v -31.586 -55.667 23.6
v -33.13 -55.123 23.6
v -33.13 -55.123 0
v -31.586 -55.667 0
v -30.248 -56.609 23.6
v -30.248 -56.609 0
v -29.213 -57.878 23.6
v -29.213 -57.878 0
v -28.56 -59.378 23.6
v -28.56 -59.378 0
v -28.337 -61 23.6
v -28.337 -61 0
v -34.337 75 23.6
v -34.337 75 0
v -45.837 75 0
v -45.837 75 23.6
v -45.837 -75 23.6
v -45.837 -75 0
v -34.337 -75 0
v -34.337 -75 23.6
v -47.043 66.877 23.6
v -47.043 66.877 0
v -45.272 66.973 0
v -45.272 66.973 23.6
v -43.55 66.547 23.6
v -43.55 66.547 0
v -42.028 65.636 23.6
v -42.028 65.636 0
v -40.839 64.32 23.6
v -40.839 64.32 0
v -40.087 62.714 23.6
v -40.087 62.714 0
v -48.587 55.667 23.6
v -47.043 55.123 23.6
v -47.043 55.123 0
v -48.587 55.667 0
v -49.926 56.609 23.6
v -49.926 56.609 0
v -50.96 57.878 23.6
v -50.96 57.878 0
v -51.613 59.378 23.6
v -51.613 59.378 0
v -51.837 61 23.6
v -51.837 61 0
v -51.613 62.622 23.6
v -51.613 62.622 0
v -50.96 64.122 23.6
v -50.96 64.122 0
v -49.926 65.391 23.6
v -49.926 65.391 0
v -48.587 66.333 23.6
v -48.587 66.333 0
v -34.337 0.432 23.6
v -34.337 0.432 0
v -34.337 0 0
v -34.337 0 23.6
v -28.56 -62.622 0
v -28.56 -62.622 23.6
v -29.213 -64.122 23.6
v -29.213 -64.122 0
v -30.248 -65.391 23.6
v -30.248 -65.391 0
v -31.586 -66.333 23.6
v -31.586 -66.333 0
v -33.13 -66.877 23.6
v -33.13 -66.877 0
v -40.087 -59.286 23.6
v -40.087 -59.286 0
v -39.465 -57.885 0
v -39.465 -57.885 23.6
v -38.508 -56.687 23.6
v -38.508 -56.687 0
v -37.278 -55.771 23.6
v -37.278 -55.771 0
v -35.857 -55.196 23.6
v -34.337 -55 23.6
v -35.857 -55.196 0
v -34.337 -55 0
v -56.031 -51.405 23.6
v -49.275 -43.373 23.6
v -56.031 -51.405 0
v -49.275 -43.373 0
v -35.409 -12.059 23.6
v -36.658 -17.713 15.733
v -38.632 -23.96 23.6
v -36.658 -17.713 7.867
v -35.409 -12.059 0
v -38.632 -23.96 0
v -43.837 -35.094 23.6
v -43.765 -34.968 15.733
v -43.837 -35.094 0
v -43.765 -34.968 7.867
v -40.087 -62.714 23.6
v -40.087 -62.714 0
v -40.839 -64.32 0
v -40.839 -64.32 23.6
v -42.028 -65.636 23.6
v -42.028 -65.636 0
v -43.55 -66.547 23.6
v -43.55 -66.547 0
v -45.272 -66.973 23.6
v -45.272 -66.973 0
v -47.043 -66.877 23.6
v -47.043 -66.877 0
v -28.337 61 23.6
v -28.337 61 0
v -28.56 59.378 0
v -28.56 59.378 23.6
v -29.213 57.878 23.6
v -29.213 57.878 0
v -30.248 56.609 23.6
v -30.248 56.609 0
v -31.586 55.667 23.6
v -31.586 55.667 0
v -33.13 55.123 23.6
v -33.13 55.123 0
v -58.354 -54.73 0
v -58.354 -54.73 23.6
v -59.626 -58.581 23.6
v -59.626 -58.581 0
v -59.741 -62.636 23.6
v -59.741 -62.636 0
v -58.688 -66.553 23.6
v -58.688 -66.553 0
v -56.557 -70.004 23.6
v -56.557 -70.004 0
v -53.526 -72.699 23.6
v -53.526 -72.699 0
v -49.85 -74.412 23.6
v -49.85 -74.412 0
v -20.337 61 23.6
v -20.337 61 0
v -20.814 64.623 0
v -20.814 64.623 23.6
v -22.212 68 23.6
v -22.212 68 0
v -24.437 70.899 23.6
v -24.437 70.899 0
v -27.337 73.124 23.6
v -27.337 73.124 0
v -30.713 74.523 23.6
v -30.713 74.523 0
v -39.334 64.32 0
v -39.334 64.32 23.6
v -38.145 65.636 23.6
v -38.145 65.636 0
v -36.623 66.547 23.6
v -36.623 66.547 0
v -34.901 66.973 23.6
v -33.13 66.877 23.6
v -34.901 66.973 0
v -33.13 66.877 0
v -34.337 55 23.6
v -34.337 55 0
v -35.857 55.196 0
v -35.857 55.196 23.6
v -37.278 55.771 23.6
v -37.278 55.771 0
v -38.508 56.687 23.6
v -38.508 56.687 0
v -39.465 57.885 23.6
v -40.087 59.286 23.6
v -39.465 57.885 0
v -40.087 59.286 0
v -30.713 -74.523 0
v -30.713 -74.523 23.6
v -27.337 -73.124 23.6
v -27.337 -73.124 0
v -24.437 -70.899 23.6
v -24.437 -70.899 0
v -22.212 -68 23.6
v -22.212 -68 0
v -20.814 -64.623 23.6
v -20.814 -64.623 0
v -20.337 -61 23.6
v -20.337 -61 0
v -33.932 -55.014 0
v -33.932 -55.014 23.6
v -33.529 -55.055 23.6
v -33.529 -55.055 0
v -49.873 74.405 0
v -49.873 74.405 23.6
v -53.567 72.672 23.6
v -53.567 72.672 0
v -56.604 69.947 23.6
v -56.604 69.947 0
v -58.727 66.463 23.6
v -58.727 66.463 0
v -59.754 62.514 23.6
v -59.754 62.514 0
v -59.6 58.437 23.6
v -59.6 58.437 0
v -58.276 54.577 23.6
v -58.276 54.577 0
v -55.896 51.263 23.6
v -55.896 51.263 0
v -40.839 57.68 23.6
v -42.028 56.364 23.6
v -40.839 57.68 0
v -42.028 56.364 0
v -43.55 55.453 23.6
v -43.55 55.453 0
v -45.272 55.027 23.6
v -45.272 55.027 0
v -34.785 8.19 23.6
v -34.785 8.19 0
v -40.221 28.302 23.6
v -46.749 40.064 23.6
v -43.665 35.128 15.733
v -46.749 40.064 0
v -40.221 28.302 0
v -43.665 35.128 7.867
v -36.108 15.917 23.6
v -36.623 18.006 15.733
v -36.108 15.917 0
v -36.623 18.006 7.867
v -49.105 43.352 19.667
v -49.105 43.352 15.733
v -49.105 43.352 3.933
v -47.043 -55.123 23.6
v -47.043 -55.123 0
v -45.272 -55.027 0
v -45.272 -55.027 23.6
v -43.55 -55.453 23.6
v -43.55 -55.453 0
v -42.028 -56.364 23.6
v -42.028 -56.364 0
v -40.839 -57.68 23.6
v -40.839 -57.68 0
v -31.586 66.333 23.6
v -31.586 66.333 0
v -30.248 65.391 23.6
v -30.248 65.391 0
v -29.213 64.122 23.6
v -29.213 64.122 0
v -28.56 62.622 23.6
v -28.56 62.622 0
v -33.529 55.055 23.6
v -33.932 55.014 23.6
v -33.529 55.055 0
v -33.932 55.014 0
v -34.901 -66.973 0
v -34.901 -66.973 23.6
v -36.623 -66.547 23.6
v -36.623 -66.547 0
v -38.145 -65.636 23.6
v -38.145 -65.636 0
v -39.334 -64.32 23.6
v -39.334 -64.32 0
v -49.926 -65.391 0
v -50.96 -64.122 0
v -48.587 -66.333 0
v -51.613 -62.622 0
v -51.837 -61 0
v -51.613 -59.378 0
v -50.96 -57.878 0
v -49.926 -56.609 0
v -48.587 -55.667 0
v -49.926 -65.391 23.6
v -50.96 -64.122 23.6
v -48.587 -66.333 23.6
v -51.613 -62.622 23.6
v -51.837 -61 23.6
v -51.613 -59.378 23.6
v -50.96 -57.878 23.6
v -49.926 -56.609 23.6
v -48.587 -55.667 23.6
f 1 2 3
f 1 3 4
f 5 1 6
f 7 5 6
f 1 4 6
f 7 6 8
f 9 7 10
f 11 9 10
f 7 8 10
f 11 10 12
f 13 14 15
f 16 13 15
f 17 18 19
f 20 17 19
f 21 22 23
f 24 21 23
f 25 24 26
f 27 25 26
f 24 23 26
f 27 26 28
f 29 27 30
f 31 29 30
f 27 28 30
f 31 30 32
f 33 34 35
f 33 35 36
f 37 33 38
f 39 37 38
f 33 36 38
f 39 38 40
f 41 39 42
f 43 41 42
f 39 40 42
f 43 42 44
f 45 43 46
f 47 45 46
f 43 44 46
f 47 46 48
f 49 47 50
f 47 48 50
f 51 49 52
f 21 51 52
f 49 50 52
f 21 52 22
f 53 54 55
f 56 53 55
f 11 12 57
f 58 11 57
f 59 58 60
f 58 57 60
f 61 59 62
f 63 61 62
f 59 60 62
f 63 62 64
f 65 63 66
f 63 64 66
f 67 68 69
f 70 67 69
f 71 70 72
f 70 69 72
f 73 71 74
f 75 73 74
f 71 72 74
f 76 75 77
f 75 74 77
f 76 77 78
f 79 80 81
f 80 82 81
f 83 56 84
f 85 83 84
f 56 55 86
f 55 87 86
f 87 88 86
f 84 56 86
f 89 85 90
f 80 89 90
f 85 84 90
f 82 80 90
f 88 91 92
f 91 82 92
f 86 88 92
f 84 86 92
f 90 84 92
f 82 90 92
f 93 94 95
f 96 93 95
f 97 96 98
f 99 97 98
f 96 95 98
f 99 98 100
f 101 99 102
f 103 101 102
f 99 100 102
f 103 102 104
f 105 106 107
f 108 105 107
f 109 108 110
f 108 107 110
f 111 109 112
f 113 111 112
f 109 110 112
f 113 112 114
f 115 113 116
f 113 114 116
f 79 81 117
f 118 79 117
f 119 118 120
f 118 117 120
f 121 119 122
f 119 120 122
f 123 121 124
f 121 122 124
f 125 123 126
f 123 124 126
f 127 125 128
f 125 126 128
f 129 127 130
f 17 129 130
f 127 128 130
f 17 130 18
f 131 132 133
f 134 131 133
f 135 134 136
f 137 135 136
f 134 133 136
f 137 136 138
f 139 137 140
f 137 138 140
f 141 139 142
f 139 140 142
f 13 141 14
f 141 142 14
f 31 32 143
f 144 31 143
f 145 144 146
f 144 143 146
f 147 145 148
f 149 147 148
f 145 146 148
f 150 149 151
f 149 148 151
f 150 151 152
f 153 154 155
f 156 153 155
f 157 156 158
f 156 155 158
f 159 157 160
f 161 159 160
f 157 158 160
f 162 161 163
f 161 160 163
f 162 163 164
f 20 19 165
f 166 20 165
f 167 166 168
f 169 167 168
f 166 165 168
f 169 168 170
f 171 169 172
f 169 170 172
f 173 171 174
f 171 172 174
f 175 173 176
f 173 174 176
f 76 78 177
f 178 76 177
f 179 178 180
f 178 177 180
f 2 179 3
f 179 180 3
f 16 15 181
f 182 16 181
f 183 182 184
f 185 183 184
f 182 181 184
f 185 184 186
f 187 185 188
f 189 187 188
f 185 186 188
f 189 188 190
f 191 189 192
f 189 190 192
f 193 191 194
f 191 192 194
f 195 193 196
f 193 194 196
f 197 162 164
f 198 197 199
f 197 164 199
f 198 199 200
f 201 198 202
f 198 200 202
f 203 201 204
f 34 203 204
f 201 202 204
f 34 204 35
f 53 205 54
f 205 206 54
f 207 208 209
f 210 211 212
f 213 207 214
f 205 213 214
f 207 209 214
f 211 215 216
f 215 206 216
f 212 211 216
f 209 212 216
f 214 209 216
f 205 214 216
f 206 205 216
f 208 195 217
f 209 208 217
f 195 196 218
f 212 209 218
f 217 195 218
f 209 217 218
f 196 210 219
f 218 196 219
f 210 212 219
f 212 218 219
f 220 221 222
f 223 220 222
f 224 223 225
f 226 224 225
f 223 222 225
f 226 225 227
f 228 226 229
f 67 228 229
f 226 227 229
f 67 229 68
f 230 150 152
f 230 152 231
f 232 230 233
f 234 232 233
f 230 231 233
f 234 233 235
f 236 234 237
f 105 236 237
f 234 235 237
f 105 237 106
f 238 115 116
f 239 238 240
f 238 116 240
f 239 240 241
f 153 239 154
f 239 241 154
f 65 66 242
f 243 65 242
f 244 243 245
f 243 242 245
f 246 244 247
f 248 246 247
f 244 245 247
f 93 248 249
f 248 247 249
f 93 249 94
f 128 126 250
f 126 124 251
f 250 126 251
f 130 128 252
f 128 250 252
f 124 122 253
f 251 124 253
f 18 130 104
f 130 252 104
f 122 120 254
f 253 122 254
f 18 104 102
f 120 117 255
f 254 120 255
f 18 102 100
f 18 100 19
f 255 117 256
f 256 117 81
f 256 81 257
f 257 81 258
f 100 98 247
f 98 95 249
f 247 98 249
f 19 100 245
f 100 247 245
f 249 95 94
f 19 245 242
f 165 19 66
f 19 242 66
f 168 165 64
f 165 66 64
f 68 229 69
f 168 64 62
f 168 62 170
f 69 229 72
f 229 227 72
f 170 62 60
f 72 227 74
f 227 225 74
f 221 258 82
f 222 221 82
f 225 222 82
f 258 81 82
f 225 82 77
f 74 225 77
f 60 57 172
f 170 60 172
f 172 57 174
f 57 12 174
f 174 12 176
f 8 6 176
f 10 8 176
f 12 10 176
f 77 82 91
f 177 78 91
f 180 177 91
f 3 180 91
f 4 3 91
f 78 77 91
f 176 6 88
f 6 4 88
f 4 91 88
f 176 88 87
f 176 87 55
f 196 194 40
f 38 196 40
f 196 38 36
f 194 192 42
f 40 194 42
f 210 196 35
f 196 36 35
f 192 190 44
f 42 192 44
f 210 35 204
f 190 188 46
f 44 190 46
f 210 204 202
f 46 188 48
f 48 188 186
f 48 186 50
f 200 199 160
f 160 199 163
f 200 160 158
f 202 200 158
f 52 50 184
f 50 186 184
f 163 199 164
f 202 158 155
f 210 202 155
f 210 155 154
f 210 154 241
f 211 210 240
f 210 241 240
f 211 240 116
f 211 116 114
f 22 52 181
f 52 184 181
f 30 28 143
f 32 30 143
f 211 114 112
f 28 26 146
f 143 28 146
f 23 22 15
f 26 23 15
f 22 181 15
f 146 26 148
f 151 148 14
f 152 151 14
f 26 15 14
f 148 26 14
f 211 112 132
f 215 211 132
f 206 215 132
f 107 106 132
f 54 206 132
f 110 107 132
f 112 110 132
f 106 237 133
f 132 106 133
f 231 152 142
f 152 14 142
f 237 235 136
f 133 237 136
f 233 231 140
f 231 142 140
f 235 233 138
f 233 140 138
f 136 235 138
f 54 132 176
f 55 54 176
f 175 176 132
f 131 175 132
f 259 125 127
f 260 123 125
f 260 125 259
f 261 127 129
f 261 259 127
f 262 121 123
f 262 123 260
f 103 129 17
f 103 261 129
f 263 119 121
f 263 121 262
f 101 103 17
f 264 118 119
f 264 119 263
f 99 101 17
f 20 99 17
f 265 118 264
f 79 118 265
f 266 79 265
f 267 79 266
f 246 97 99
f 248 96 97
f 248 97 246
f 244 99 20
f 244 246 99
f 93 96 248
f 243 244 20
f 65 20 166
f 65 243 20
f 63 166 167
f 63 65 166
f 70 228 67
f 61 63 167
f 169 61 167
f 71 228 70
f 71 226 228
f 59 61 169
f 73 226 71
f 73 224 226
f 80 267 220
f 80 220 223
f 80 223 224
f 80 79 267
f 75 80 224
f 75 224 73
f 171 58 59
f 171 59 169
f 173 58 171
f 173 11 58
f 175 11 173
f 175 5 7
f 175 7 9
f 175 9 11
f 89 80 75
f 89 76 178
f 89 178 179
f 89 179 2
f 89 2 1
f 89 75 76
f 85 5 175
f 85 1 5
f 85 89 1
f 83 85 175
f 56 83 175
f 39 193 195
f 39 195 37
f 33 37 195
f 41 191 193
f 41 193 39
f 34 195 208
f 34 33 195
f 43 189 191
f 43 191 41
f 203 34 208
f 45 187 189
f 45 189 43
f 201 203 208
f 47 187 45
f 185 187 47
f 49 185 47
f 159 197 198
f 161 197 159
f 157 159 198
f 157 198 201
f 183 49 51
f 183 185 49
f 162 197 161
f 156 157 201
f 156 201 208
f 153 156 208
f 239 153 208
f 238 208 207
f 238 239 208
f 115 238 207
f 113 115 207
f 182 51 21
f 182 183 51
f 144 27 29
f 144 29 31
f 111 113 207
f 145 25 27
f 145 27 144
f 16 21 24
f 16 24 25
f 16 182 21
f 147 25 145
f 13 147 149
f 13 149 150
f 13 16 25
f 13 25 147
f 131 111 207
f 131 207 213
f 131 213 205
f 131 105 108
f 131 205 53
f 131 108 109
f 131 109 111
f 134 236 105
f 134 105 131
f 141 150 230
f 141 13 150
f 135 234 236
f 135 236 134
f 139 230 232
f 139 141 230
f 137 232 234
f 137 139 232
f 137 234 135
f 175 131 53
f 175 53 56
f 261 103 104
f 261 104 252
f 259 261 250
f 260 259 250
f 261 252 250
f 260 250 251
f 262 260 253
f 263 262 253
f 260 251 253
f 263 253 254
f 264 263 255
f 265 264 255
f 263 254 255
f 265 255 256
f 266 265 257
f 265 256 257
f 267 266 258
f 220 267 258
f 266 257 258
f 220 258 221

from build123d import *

# Parameters (mm, degrees)
F1_DEPTH = 23.6


with BuildPart() as f1:
    # F0 (on Top) → F1 (new body)
    with BuildSketch(Plane.XY):
        with BuildLine():
            ThreePointArc((-33.1300476876, 66.8774403692), (-29.6868850055, 64.7921543722), (-28.3365694268, 61))
            ThreePointArc((-28.3365694268, 61), (-29.6868850055, 57.2078456278), (-33.1300476876, 55.1225596308))
            ThreePointArc((-33.1300476876, 55.1225596308), (-33.6875488508, 54.042895786), (-34.3365694268, 53.0156402887))
            Line((-34.3365694268, 53.0156402887), (-34.3365694268, 47))
            ThreePointArc((-34.3365694268, 47), (-24.4370744902, 51.1005050634), (-20.3365694268, 61))
            ThreePointArc((-20.3365694268, 61), (-24.4370744902, 70.8994949366), (-34.3365694268, 75))
            ThreePointArc((-34.3365694268, 75), (-37.2771676859, 74.6876908892), (-40.0865694268, 73.7646974112))
            ThreePointArc((-40.0865694268, 73.7646974112), (-35.9867280033, 70.9489006394), (-33.1300476876, 66.8774403692))
        make_face()
        with BuildLine():
            ThreePointArc((-45.8365694268, 75), (-42.8959711677, 74.6876908892), (-40.0865694268, 73.7646974112))
            ThreePointArc((-40.0865694268, 73.7646974112), (-37.2771676859, 74.6876908892), (-34.3365694268, 75))
            Line((-34.3365694268, 75), (-45.8365694268, 75))
        make_face()
        with BuildLine():
            ThreePointArc((-47.0430911659, 66.8774403692), (-44.1864108503, 70.9489006394), (-40.0865694268, 73.7646974112))
            ThreePointArc((-40.0865694268, 73.7646974112), (-42.8959711677, 74.6876908892), (-45.8365694268, 75))
            ThreePointArc((-45.8365694268, 75), (-58.7268044704, 66.4627685766), (-55.8960509898, 51.2631200745))
            ThreePointArc((-55.8960509898, 51.2631200745), (-48.4699754944, 47.2499028191), (-40.0865694268, 48.2353025888))
            ThreePointArc((-40.0865694268, 48.2353025888), (-44.1864108503, 51.0510993606), (-47.0430911659, 55.1225596308))
            ThreePointArc((-47.0430911659, 55.1225596308), (-51.8365694268, 61), (-47.0430911659, 66.8774403692))
        make_face()
        with BuildLine():
            ThreePointArc((-20.3365694268, 61), (-24.4370744902, 51.1005050634), (-34.3365694268, 47))
            Line((-34.3365694268, 47), (-34.3365694268, 0.4321282686))
            add(Edge.make_bspline(
                [(-34.3365694268, 0.4321282686), (-34.3361365089, 0.2880770506), (-34.3361368633, 0.1440338578), (-34.3365694268, 0)],
                knots=[0.496094715, 0.496094715, 0.496094715, 0.496094715, 0.4996371995, 0.4996371995, 0.4996371995, 0.4996371995], degree=3))
            Line((-34.3365694268, 0), (-34.3365694268, -47))
            ThreePointArc((-34.3365694268, -47), (-24.4370744902, -51.1005050634), (-20.3365694268, -61))
            Line((-20.3365694268, -61), (-20.3365694268, 61))
        make_face()
        with BuildLine():
            Line((-34.3365694268, 0.4321282686), (-34.3365694268, 47))
            ThreePointArc((-34.3365694268, 47), (-37.2771676859, 47.3123091108), (-40.0865694268, 48.2353025888))
            ThreePointArc((-40.0865694268, 48.2353025888), (-48.4699754944, 47.2499028191), (-55.8960509898, 51.2631200745))
            add(Edge.make_bspline(
                [(-55.8960509898, 51.2631200745), (-40.9271633104, 35.7982841304), (-34.3895319866, 18.0551513004), (-34.3365694268, 0.4321282686)],
                knots=[0.0627121484, 0.0627121484, 0.0627121484, 0.0627121484, 0.496094715, 0.496094715, 0.496094715, 0.496094715], degree=3))
        make_face()
        with BuildLine():
            add(Edge.make_bspline(
                [(-34.3365694268, 0.4321282686), (-34.3361365089, 0.2880770506), (-34.3361368633, 0.1440338578), (-34.3365694268, 0)],
                knots=[0.496094715, 0.496094715, 0.496094715, 0.496094715, 0.4996371995, 0.4996371995, 0.4996371995, 0.4996371995], degree=3))
            Line((-34.3365694268, 0.4321282686), (-34.3365694268, 0))
        make_face()
        with BuildLine():
            ThreePointArc((-34.3365694268, -75), (-24.4370744902, -70.8994949366), (-20.3365694268, -61))
            ThreePointArc((-20.3365694268, -61), (-24.4370744902, -51.1005050634), (-34.3365694268, -47))
            Line((-34.3365694268, -47), (-34.3365694268, -53.0156402887))
            ThreePointArc((-34.3365694268, -53.0156402887), (-33.6875488508, -54.042895786), (-33.1300476876, -55.1225596308))
            ThreePointArc((-33.1300476876, -55.1225596308), (-29.6868850055, -57.2078456278), (-28.3365694268, -61))
            ThreePointArc((-28.3365694268, -61), (-29.6868850055, -64.7921543722), (-33.1300476876, -66.8774403692))
            ThreePointArc((-33.1300476876, -66.8774403692), (-35.9867280033, -70.9489006394), (-40.0865694268, -73.7646974112))
            ThreePointArc((-40.0865694268, -73.7646974112), (-37.2771676859, -74.6876908892), (-34.3365694268, -75))
        make_face()
        with BuildLine():
            Line((-34.3365694268, -47), (-34.3365694268, 0))
            add(Edge.make_bspline(
                [(-34.3365694268, 0), (-34.3900880153, -17.8204800119), (-41.0597288004, -35.4980627256), (-56.0312077554, -51.4047225497)],
                knots=[0.4996371995, 0.4996371995, 0.4996371995, 0.4996371995, 0.9379284167, 0.9379284167, 0.9379284167, 0.9379284167], degree=3))
            ThreePointArc((-56.0312077554, -51.4047225497), (-48.5660397399, -47.2686493086), (-40.0865694268, -48.2353025888))
            ThreePointArc((-40.0865694268, -48.2353025888), (-37.2771676859, -47.3123091108), (-34.3365694268, -47))
        make_face()
        with BuildLine():
            Line((-45.8365694268, -75), (-34.3365694268, -75))
            ThreePointArc((-34.3365694268, -75), (-37.2771676859, -74.6876908892), (-40.0865694268, -73.7646974112))
            ThreePointArc((-40.0865694268, -73.7646974112), (-42.8959711677, -74.6876908892), (-45.8365694268, -75))
        make_face()
        with BuildLine():
            ThreePointArc((-40.0865694268, -48.2353025888), (-48.5660397399, -47.2686493086), (-56.0312077554, -51.4047225497))
            ThreePointArc((-56.0312077554, -51.4047225497), (-58.6882985771, -66.5527522768), (-45.8365694268, -75))
            ThreePointArc((-45.8365694268, -75), (-42.8959711677, -74.6876908892), (-40.0865694268, -73.7646974112))
            ThreePointArc((-40.0865694268, -73.7646974112), (-44.1864108503, -70.9489006394), (-47.0430911659, -66.8774403692))
            ThreePointArc((-47.0430911659, -66.8774403692), (-51.8365694268, -61), (-47.0430911659, -55.1225596308))
            ThreePointArc((-47.0430911659, -55.1225596308), (-44.1864108503, -51.0510993606), (-40.0865694268, -48.2353025888))
        make_face()
        with BuildLine():
            ThreePointArc((-33.1300476876, -55.1225596308), (-33.6875488508, -54.042895786), (-34.3365694268, -53.0156402887))
            Line((-34.3365694268, -53.0156402887), (-34.3365694268, -55))
            ThreePointArc((-34.3365694268, -55), (-33.730204114, -55.0307185435), (-33.1300476876, -55.1225596308))
        make_face()
        with BuildLine():
            ThreePointArc((-40.0865694268, 62.7139136501), (-37.4178901439, 66.1483456215), (-33.1300476876, 66.8774403692))
            ThreePointArc((-33.1300476876, 66.8774403692), (-35.9867280033, 70.9489006394), (-40.0865694268, 73.7646974112))
            ThreePointArc((-40.0865694268, 73.7646974112), (-44.1864108503, 70.9489006394), (-47.0430911659, 66.8774403692))
            ThreePointArc((-47.0430911659, 66.8774403692), (-42.7552487096, 66.1483456215), (-40.0865694268, 62.7139136501))
        make_face()
        with BuildLine():
            Line((-34.3365694268, 53.0156402887), (-34.3365694268, 55))
            ThreePointArc((-34.3365694268, 55), (-37.922410897, 56.1894136584), (-40.0865694268, 59.2860863499))
            ThreePointArc((-40.0865694268, 59.2860863499), (-42.7552487096, 55.8516543785), (-47.0430911659, 55.1225596308))
            ThreePointArc((-47.0430911659, 55.1225596308), (-44.1864108503, 51.0510993606), (-40.0865694268, 48.2353025888))
            ThreePointArc((-40.0865694268, 48.2353025888), (-36.886511766, 50.2344778172), (-34.3365694268, 53.0156402887))
        make_face()
        with BuildLine():
            Line((-34.3365694268, 47), (-34.3365694268, 53.0156402887))
            ThreePointArc((-34.3365694268, 53.0156402887), (-36.886511766, 50.2344778172), (-40.0865694268, 48.2353025888))
            ThreePointArc((-40.0865694268, 48.2353025888), (-37.2771676859, 47.3123091108), (-34.3365694268, 47))
        make_face()
        with BuildLine():
            ThreePointArc((-47.0430911659, -66.8774403692), (-44.1864108503, -70.9489006394), (-40.0865694268, -73.7646974112))
            ThreePointArc((-40.0865694268, -73.7646974112), (-35.9867280033, -70.9489006394), (-33.1300476876, -66.8774403692))
            ThreePointArc((-33.1300476876, -66.8774403692), (-37.4178901439, -66.1483456215), (-40.0865694268, -62.7139136501))
            ThreePointArc((-40.0865694268, -62.7139136501), (-42.7552487096, -66.1483456215), (-47.0430911659, -66.8774403692))
        make_face()
        with BuildLine():
            Line((-34.3365694268, -53.0156402887), (-34.3365694268, -47))
            ThreePointArc((-34.3365694268, -47), (-37.2771676859, -47.3123091108), (-40.0865694268, -48.2353025888))
            ThreePointArc((-40.0865694268, -48.2353025888), (-36.886511766, -50.2344778172), (-34.3365694268, -53.0156402887))
        make_face()
        with BuildLine():
            Line((-34.3365694268, -55), (-34.3365694268, -53.0156402887))
            ThreePointArc((-34.3365694268, -53.0156402887), (-36.886511766, -50.2344778172), (-40.0865694268, -48.2353025888))
            ThreePointArc((-40.0865694268, -48.2353025888), (-44.1864108503, -51.0510993606), (-47.0430911659, -55.1225596308))
            ThreePointArc((-47.0430911659, -55.1225596308), (-42.7552487096, -55.8516543785), (-40.0865694268, -59.2860863499))
            ThreePointArc((-40.0865694268, -59.2860863499), (-37.922410897, -56.1894136584), (-34.3365694268, -55))
        make_face()
        with BuildLine():
            ThreePointArc((-34.3365694268, 53.0156402887), (-33.6875488508, 54.042895786), (-33.1300476876, 55.1225596308))
            ThreePointArc((-33.1300476876, 55.1225596308), (-33.730204114, 55.0307185435), (-34.3365694268, 55))
            Line((-34.3365694268, 55), (-34.3365694268, 53.0156402887))
        make_face()
    extrude(amount=F1_DEPTH)


solid = f1.part
